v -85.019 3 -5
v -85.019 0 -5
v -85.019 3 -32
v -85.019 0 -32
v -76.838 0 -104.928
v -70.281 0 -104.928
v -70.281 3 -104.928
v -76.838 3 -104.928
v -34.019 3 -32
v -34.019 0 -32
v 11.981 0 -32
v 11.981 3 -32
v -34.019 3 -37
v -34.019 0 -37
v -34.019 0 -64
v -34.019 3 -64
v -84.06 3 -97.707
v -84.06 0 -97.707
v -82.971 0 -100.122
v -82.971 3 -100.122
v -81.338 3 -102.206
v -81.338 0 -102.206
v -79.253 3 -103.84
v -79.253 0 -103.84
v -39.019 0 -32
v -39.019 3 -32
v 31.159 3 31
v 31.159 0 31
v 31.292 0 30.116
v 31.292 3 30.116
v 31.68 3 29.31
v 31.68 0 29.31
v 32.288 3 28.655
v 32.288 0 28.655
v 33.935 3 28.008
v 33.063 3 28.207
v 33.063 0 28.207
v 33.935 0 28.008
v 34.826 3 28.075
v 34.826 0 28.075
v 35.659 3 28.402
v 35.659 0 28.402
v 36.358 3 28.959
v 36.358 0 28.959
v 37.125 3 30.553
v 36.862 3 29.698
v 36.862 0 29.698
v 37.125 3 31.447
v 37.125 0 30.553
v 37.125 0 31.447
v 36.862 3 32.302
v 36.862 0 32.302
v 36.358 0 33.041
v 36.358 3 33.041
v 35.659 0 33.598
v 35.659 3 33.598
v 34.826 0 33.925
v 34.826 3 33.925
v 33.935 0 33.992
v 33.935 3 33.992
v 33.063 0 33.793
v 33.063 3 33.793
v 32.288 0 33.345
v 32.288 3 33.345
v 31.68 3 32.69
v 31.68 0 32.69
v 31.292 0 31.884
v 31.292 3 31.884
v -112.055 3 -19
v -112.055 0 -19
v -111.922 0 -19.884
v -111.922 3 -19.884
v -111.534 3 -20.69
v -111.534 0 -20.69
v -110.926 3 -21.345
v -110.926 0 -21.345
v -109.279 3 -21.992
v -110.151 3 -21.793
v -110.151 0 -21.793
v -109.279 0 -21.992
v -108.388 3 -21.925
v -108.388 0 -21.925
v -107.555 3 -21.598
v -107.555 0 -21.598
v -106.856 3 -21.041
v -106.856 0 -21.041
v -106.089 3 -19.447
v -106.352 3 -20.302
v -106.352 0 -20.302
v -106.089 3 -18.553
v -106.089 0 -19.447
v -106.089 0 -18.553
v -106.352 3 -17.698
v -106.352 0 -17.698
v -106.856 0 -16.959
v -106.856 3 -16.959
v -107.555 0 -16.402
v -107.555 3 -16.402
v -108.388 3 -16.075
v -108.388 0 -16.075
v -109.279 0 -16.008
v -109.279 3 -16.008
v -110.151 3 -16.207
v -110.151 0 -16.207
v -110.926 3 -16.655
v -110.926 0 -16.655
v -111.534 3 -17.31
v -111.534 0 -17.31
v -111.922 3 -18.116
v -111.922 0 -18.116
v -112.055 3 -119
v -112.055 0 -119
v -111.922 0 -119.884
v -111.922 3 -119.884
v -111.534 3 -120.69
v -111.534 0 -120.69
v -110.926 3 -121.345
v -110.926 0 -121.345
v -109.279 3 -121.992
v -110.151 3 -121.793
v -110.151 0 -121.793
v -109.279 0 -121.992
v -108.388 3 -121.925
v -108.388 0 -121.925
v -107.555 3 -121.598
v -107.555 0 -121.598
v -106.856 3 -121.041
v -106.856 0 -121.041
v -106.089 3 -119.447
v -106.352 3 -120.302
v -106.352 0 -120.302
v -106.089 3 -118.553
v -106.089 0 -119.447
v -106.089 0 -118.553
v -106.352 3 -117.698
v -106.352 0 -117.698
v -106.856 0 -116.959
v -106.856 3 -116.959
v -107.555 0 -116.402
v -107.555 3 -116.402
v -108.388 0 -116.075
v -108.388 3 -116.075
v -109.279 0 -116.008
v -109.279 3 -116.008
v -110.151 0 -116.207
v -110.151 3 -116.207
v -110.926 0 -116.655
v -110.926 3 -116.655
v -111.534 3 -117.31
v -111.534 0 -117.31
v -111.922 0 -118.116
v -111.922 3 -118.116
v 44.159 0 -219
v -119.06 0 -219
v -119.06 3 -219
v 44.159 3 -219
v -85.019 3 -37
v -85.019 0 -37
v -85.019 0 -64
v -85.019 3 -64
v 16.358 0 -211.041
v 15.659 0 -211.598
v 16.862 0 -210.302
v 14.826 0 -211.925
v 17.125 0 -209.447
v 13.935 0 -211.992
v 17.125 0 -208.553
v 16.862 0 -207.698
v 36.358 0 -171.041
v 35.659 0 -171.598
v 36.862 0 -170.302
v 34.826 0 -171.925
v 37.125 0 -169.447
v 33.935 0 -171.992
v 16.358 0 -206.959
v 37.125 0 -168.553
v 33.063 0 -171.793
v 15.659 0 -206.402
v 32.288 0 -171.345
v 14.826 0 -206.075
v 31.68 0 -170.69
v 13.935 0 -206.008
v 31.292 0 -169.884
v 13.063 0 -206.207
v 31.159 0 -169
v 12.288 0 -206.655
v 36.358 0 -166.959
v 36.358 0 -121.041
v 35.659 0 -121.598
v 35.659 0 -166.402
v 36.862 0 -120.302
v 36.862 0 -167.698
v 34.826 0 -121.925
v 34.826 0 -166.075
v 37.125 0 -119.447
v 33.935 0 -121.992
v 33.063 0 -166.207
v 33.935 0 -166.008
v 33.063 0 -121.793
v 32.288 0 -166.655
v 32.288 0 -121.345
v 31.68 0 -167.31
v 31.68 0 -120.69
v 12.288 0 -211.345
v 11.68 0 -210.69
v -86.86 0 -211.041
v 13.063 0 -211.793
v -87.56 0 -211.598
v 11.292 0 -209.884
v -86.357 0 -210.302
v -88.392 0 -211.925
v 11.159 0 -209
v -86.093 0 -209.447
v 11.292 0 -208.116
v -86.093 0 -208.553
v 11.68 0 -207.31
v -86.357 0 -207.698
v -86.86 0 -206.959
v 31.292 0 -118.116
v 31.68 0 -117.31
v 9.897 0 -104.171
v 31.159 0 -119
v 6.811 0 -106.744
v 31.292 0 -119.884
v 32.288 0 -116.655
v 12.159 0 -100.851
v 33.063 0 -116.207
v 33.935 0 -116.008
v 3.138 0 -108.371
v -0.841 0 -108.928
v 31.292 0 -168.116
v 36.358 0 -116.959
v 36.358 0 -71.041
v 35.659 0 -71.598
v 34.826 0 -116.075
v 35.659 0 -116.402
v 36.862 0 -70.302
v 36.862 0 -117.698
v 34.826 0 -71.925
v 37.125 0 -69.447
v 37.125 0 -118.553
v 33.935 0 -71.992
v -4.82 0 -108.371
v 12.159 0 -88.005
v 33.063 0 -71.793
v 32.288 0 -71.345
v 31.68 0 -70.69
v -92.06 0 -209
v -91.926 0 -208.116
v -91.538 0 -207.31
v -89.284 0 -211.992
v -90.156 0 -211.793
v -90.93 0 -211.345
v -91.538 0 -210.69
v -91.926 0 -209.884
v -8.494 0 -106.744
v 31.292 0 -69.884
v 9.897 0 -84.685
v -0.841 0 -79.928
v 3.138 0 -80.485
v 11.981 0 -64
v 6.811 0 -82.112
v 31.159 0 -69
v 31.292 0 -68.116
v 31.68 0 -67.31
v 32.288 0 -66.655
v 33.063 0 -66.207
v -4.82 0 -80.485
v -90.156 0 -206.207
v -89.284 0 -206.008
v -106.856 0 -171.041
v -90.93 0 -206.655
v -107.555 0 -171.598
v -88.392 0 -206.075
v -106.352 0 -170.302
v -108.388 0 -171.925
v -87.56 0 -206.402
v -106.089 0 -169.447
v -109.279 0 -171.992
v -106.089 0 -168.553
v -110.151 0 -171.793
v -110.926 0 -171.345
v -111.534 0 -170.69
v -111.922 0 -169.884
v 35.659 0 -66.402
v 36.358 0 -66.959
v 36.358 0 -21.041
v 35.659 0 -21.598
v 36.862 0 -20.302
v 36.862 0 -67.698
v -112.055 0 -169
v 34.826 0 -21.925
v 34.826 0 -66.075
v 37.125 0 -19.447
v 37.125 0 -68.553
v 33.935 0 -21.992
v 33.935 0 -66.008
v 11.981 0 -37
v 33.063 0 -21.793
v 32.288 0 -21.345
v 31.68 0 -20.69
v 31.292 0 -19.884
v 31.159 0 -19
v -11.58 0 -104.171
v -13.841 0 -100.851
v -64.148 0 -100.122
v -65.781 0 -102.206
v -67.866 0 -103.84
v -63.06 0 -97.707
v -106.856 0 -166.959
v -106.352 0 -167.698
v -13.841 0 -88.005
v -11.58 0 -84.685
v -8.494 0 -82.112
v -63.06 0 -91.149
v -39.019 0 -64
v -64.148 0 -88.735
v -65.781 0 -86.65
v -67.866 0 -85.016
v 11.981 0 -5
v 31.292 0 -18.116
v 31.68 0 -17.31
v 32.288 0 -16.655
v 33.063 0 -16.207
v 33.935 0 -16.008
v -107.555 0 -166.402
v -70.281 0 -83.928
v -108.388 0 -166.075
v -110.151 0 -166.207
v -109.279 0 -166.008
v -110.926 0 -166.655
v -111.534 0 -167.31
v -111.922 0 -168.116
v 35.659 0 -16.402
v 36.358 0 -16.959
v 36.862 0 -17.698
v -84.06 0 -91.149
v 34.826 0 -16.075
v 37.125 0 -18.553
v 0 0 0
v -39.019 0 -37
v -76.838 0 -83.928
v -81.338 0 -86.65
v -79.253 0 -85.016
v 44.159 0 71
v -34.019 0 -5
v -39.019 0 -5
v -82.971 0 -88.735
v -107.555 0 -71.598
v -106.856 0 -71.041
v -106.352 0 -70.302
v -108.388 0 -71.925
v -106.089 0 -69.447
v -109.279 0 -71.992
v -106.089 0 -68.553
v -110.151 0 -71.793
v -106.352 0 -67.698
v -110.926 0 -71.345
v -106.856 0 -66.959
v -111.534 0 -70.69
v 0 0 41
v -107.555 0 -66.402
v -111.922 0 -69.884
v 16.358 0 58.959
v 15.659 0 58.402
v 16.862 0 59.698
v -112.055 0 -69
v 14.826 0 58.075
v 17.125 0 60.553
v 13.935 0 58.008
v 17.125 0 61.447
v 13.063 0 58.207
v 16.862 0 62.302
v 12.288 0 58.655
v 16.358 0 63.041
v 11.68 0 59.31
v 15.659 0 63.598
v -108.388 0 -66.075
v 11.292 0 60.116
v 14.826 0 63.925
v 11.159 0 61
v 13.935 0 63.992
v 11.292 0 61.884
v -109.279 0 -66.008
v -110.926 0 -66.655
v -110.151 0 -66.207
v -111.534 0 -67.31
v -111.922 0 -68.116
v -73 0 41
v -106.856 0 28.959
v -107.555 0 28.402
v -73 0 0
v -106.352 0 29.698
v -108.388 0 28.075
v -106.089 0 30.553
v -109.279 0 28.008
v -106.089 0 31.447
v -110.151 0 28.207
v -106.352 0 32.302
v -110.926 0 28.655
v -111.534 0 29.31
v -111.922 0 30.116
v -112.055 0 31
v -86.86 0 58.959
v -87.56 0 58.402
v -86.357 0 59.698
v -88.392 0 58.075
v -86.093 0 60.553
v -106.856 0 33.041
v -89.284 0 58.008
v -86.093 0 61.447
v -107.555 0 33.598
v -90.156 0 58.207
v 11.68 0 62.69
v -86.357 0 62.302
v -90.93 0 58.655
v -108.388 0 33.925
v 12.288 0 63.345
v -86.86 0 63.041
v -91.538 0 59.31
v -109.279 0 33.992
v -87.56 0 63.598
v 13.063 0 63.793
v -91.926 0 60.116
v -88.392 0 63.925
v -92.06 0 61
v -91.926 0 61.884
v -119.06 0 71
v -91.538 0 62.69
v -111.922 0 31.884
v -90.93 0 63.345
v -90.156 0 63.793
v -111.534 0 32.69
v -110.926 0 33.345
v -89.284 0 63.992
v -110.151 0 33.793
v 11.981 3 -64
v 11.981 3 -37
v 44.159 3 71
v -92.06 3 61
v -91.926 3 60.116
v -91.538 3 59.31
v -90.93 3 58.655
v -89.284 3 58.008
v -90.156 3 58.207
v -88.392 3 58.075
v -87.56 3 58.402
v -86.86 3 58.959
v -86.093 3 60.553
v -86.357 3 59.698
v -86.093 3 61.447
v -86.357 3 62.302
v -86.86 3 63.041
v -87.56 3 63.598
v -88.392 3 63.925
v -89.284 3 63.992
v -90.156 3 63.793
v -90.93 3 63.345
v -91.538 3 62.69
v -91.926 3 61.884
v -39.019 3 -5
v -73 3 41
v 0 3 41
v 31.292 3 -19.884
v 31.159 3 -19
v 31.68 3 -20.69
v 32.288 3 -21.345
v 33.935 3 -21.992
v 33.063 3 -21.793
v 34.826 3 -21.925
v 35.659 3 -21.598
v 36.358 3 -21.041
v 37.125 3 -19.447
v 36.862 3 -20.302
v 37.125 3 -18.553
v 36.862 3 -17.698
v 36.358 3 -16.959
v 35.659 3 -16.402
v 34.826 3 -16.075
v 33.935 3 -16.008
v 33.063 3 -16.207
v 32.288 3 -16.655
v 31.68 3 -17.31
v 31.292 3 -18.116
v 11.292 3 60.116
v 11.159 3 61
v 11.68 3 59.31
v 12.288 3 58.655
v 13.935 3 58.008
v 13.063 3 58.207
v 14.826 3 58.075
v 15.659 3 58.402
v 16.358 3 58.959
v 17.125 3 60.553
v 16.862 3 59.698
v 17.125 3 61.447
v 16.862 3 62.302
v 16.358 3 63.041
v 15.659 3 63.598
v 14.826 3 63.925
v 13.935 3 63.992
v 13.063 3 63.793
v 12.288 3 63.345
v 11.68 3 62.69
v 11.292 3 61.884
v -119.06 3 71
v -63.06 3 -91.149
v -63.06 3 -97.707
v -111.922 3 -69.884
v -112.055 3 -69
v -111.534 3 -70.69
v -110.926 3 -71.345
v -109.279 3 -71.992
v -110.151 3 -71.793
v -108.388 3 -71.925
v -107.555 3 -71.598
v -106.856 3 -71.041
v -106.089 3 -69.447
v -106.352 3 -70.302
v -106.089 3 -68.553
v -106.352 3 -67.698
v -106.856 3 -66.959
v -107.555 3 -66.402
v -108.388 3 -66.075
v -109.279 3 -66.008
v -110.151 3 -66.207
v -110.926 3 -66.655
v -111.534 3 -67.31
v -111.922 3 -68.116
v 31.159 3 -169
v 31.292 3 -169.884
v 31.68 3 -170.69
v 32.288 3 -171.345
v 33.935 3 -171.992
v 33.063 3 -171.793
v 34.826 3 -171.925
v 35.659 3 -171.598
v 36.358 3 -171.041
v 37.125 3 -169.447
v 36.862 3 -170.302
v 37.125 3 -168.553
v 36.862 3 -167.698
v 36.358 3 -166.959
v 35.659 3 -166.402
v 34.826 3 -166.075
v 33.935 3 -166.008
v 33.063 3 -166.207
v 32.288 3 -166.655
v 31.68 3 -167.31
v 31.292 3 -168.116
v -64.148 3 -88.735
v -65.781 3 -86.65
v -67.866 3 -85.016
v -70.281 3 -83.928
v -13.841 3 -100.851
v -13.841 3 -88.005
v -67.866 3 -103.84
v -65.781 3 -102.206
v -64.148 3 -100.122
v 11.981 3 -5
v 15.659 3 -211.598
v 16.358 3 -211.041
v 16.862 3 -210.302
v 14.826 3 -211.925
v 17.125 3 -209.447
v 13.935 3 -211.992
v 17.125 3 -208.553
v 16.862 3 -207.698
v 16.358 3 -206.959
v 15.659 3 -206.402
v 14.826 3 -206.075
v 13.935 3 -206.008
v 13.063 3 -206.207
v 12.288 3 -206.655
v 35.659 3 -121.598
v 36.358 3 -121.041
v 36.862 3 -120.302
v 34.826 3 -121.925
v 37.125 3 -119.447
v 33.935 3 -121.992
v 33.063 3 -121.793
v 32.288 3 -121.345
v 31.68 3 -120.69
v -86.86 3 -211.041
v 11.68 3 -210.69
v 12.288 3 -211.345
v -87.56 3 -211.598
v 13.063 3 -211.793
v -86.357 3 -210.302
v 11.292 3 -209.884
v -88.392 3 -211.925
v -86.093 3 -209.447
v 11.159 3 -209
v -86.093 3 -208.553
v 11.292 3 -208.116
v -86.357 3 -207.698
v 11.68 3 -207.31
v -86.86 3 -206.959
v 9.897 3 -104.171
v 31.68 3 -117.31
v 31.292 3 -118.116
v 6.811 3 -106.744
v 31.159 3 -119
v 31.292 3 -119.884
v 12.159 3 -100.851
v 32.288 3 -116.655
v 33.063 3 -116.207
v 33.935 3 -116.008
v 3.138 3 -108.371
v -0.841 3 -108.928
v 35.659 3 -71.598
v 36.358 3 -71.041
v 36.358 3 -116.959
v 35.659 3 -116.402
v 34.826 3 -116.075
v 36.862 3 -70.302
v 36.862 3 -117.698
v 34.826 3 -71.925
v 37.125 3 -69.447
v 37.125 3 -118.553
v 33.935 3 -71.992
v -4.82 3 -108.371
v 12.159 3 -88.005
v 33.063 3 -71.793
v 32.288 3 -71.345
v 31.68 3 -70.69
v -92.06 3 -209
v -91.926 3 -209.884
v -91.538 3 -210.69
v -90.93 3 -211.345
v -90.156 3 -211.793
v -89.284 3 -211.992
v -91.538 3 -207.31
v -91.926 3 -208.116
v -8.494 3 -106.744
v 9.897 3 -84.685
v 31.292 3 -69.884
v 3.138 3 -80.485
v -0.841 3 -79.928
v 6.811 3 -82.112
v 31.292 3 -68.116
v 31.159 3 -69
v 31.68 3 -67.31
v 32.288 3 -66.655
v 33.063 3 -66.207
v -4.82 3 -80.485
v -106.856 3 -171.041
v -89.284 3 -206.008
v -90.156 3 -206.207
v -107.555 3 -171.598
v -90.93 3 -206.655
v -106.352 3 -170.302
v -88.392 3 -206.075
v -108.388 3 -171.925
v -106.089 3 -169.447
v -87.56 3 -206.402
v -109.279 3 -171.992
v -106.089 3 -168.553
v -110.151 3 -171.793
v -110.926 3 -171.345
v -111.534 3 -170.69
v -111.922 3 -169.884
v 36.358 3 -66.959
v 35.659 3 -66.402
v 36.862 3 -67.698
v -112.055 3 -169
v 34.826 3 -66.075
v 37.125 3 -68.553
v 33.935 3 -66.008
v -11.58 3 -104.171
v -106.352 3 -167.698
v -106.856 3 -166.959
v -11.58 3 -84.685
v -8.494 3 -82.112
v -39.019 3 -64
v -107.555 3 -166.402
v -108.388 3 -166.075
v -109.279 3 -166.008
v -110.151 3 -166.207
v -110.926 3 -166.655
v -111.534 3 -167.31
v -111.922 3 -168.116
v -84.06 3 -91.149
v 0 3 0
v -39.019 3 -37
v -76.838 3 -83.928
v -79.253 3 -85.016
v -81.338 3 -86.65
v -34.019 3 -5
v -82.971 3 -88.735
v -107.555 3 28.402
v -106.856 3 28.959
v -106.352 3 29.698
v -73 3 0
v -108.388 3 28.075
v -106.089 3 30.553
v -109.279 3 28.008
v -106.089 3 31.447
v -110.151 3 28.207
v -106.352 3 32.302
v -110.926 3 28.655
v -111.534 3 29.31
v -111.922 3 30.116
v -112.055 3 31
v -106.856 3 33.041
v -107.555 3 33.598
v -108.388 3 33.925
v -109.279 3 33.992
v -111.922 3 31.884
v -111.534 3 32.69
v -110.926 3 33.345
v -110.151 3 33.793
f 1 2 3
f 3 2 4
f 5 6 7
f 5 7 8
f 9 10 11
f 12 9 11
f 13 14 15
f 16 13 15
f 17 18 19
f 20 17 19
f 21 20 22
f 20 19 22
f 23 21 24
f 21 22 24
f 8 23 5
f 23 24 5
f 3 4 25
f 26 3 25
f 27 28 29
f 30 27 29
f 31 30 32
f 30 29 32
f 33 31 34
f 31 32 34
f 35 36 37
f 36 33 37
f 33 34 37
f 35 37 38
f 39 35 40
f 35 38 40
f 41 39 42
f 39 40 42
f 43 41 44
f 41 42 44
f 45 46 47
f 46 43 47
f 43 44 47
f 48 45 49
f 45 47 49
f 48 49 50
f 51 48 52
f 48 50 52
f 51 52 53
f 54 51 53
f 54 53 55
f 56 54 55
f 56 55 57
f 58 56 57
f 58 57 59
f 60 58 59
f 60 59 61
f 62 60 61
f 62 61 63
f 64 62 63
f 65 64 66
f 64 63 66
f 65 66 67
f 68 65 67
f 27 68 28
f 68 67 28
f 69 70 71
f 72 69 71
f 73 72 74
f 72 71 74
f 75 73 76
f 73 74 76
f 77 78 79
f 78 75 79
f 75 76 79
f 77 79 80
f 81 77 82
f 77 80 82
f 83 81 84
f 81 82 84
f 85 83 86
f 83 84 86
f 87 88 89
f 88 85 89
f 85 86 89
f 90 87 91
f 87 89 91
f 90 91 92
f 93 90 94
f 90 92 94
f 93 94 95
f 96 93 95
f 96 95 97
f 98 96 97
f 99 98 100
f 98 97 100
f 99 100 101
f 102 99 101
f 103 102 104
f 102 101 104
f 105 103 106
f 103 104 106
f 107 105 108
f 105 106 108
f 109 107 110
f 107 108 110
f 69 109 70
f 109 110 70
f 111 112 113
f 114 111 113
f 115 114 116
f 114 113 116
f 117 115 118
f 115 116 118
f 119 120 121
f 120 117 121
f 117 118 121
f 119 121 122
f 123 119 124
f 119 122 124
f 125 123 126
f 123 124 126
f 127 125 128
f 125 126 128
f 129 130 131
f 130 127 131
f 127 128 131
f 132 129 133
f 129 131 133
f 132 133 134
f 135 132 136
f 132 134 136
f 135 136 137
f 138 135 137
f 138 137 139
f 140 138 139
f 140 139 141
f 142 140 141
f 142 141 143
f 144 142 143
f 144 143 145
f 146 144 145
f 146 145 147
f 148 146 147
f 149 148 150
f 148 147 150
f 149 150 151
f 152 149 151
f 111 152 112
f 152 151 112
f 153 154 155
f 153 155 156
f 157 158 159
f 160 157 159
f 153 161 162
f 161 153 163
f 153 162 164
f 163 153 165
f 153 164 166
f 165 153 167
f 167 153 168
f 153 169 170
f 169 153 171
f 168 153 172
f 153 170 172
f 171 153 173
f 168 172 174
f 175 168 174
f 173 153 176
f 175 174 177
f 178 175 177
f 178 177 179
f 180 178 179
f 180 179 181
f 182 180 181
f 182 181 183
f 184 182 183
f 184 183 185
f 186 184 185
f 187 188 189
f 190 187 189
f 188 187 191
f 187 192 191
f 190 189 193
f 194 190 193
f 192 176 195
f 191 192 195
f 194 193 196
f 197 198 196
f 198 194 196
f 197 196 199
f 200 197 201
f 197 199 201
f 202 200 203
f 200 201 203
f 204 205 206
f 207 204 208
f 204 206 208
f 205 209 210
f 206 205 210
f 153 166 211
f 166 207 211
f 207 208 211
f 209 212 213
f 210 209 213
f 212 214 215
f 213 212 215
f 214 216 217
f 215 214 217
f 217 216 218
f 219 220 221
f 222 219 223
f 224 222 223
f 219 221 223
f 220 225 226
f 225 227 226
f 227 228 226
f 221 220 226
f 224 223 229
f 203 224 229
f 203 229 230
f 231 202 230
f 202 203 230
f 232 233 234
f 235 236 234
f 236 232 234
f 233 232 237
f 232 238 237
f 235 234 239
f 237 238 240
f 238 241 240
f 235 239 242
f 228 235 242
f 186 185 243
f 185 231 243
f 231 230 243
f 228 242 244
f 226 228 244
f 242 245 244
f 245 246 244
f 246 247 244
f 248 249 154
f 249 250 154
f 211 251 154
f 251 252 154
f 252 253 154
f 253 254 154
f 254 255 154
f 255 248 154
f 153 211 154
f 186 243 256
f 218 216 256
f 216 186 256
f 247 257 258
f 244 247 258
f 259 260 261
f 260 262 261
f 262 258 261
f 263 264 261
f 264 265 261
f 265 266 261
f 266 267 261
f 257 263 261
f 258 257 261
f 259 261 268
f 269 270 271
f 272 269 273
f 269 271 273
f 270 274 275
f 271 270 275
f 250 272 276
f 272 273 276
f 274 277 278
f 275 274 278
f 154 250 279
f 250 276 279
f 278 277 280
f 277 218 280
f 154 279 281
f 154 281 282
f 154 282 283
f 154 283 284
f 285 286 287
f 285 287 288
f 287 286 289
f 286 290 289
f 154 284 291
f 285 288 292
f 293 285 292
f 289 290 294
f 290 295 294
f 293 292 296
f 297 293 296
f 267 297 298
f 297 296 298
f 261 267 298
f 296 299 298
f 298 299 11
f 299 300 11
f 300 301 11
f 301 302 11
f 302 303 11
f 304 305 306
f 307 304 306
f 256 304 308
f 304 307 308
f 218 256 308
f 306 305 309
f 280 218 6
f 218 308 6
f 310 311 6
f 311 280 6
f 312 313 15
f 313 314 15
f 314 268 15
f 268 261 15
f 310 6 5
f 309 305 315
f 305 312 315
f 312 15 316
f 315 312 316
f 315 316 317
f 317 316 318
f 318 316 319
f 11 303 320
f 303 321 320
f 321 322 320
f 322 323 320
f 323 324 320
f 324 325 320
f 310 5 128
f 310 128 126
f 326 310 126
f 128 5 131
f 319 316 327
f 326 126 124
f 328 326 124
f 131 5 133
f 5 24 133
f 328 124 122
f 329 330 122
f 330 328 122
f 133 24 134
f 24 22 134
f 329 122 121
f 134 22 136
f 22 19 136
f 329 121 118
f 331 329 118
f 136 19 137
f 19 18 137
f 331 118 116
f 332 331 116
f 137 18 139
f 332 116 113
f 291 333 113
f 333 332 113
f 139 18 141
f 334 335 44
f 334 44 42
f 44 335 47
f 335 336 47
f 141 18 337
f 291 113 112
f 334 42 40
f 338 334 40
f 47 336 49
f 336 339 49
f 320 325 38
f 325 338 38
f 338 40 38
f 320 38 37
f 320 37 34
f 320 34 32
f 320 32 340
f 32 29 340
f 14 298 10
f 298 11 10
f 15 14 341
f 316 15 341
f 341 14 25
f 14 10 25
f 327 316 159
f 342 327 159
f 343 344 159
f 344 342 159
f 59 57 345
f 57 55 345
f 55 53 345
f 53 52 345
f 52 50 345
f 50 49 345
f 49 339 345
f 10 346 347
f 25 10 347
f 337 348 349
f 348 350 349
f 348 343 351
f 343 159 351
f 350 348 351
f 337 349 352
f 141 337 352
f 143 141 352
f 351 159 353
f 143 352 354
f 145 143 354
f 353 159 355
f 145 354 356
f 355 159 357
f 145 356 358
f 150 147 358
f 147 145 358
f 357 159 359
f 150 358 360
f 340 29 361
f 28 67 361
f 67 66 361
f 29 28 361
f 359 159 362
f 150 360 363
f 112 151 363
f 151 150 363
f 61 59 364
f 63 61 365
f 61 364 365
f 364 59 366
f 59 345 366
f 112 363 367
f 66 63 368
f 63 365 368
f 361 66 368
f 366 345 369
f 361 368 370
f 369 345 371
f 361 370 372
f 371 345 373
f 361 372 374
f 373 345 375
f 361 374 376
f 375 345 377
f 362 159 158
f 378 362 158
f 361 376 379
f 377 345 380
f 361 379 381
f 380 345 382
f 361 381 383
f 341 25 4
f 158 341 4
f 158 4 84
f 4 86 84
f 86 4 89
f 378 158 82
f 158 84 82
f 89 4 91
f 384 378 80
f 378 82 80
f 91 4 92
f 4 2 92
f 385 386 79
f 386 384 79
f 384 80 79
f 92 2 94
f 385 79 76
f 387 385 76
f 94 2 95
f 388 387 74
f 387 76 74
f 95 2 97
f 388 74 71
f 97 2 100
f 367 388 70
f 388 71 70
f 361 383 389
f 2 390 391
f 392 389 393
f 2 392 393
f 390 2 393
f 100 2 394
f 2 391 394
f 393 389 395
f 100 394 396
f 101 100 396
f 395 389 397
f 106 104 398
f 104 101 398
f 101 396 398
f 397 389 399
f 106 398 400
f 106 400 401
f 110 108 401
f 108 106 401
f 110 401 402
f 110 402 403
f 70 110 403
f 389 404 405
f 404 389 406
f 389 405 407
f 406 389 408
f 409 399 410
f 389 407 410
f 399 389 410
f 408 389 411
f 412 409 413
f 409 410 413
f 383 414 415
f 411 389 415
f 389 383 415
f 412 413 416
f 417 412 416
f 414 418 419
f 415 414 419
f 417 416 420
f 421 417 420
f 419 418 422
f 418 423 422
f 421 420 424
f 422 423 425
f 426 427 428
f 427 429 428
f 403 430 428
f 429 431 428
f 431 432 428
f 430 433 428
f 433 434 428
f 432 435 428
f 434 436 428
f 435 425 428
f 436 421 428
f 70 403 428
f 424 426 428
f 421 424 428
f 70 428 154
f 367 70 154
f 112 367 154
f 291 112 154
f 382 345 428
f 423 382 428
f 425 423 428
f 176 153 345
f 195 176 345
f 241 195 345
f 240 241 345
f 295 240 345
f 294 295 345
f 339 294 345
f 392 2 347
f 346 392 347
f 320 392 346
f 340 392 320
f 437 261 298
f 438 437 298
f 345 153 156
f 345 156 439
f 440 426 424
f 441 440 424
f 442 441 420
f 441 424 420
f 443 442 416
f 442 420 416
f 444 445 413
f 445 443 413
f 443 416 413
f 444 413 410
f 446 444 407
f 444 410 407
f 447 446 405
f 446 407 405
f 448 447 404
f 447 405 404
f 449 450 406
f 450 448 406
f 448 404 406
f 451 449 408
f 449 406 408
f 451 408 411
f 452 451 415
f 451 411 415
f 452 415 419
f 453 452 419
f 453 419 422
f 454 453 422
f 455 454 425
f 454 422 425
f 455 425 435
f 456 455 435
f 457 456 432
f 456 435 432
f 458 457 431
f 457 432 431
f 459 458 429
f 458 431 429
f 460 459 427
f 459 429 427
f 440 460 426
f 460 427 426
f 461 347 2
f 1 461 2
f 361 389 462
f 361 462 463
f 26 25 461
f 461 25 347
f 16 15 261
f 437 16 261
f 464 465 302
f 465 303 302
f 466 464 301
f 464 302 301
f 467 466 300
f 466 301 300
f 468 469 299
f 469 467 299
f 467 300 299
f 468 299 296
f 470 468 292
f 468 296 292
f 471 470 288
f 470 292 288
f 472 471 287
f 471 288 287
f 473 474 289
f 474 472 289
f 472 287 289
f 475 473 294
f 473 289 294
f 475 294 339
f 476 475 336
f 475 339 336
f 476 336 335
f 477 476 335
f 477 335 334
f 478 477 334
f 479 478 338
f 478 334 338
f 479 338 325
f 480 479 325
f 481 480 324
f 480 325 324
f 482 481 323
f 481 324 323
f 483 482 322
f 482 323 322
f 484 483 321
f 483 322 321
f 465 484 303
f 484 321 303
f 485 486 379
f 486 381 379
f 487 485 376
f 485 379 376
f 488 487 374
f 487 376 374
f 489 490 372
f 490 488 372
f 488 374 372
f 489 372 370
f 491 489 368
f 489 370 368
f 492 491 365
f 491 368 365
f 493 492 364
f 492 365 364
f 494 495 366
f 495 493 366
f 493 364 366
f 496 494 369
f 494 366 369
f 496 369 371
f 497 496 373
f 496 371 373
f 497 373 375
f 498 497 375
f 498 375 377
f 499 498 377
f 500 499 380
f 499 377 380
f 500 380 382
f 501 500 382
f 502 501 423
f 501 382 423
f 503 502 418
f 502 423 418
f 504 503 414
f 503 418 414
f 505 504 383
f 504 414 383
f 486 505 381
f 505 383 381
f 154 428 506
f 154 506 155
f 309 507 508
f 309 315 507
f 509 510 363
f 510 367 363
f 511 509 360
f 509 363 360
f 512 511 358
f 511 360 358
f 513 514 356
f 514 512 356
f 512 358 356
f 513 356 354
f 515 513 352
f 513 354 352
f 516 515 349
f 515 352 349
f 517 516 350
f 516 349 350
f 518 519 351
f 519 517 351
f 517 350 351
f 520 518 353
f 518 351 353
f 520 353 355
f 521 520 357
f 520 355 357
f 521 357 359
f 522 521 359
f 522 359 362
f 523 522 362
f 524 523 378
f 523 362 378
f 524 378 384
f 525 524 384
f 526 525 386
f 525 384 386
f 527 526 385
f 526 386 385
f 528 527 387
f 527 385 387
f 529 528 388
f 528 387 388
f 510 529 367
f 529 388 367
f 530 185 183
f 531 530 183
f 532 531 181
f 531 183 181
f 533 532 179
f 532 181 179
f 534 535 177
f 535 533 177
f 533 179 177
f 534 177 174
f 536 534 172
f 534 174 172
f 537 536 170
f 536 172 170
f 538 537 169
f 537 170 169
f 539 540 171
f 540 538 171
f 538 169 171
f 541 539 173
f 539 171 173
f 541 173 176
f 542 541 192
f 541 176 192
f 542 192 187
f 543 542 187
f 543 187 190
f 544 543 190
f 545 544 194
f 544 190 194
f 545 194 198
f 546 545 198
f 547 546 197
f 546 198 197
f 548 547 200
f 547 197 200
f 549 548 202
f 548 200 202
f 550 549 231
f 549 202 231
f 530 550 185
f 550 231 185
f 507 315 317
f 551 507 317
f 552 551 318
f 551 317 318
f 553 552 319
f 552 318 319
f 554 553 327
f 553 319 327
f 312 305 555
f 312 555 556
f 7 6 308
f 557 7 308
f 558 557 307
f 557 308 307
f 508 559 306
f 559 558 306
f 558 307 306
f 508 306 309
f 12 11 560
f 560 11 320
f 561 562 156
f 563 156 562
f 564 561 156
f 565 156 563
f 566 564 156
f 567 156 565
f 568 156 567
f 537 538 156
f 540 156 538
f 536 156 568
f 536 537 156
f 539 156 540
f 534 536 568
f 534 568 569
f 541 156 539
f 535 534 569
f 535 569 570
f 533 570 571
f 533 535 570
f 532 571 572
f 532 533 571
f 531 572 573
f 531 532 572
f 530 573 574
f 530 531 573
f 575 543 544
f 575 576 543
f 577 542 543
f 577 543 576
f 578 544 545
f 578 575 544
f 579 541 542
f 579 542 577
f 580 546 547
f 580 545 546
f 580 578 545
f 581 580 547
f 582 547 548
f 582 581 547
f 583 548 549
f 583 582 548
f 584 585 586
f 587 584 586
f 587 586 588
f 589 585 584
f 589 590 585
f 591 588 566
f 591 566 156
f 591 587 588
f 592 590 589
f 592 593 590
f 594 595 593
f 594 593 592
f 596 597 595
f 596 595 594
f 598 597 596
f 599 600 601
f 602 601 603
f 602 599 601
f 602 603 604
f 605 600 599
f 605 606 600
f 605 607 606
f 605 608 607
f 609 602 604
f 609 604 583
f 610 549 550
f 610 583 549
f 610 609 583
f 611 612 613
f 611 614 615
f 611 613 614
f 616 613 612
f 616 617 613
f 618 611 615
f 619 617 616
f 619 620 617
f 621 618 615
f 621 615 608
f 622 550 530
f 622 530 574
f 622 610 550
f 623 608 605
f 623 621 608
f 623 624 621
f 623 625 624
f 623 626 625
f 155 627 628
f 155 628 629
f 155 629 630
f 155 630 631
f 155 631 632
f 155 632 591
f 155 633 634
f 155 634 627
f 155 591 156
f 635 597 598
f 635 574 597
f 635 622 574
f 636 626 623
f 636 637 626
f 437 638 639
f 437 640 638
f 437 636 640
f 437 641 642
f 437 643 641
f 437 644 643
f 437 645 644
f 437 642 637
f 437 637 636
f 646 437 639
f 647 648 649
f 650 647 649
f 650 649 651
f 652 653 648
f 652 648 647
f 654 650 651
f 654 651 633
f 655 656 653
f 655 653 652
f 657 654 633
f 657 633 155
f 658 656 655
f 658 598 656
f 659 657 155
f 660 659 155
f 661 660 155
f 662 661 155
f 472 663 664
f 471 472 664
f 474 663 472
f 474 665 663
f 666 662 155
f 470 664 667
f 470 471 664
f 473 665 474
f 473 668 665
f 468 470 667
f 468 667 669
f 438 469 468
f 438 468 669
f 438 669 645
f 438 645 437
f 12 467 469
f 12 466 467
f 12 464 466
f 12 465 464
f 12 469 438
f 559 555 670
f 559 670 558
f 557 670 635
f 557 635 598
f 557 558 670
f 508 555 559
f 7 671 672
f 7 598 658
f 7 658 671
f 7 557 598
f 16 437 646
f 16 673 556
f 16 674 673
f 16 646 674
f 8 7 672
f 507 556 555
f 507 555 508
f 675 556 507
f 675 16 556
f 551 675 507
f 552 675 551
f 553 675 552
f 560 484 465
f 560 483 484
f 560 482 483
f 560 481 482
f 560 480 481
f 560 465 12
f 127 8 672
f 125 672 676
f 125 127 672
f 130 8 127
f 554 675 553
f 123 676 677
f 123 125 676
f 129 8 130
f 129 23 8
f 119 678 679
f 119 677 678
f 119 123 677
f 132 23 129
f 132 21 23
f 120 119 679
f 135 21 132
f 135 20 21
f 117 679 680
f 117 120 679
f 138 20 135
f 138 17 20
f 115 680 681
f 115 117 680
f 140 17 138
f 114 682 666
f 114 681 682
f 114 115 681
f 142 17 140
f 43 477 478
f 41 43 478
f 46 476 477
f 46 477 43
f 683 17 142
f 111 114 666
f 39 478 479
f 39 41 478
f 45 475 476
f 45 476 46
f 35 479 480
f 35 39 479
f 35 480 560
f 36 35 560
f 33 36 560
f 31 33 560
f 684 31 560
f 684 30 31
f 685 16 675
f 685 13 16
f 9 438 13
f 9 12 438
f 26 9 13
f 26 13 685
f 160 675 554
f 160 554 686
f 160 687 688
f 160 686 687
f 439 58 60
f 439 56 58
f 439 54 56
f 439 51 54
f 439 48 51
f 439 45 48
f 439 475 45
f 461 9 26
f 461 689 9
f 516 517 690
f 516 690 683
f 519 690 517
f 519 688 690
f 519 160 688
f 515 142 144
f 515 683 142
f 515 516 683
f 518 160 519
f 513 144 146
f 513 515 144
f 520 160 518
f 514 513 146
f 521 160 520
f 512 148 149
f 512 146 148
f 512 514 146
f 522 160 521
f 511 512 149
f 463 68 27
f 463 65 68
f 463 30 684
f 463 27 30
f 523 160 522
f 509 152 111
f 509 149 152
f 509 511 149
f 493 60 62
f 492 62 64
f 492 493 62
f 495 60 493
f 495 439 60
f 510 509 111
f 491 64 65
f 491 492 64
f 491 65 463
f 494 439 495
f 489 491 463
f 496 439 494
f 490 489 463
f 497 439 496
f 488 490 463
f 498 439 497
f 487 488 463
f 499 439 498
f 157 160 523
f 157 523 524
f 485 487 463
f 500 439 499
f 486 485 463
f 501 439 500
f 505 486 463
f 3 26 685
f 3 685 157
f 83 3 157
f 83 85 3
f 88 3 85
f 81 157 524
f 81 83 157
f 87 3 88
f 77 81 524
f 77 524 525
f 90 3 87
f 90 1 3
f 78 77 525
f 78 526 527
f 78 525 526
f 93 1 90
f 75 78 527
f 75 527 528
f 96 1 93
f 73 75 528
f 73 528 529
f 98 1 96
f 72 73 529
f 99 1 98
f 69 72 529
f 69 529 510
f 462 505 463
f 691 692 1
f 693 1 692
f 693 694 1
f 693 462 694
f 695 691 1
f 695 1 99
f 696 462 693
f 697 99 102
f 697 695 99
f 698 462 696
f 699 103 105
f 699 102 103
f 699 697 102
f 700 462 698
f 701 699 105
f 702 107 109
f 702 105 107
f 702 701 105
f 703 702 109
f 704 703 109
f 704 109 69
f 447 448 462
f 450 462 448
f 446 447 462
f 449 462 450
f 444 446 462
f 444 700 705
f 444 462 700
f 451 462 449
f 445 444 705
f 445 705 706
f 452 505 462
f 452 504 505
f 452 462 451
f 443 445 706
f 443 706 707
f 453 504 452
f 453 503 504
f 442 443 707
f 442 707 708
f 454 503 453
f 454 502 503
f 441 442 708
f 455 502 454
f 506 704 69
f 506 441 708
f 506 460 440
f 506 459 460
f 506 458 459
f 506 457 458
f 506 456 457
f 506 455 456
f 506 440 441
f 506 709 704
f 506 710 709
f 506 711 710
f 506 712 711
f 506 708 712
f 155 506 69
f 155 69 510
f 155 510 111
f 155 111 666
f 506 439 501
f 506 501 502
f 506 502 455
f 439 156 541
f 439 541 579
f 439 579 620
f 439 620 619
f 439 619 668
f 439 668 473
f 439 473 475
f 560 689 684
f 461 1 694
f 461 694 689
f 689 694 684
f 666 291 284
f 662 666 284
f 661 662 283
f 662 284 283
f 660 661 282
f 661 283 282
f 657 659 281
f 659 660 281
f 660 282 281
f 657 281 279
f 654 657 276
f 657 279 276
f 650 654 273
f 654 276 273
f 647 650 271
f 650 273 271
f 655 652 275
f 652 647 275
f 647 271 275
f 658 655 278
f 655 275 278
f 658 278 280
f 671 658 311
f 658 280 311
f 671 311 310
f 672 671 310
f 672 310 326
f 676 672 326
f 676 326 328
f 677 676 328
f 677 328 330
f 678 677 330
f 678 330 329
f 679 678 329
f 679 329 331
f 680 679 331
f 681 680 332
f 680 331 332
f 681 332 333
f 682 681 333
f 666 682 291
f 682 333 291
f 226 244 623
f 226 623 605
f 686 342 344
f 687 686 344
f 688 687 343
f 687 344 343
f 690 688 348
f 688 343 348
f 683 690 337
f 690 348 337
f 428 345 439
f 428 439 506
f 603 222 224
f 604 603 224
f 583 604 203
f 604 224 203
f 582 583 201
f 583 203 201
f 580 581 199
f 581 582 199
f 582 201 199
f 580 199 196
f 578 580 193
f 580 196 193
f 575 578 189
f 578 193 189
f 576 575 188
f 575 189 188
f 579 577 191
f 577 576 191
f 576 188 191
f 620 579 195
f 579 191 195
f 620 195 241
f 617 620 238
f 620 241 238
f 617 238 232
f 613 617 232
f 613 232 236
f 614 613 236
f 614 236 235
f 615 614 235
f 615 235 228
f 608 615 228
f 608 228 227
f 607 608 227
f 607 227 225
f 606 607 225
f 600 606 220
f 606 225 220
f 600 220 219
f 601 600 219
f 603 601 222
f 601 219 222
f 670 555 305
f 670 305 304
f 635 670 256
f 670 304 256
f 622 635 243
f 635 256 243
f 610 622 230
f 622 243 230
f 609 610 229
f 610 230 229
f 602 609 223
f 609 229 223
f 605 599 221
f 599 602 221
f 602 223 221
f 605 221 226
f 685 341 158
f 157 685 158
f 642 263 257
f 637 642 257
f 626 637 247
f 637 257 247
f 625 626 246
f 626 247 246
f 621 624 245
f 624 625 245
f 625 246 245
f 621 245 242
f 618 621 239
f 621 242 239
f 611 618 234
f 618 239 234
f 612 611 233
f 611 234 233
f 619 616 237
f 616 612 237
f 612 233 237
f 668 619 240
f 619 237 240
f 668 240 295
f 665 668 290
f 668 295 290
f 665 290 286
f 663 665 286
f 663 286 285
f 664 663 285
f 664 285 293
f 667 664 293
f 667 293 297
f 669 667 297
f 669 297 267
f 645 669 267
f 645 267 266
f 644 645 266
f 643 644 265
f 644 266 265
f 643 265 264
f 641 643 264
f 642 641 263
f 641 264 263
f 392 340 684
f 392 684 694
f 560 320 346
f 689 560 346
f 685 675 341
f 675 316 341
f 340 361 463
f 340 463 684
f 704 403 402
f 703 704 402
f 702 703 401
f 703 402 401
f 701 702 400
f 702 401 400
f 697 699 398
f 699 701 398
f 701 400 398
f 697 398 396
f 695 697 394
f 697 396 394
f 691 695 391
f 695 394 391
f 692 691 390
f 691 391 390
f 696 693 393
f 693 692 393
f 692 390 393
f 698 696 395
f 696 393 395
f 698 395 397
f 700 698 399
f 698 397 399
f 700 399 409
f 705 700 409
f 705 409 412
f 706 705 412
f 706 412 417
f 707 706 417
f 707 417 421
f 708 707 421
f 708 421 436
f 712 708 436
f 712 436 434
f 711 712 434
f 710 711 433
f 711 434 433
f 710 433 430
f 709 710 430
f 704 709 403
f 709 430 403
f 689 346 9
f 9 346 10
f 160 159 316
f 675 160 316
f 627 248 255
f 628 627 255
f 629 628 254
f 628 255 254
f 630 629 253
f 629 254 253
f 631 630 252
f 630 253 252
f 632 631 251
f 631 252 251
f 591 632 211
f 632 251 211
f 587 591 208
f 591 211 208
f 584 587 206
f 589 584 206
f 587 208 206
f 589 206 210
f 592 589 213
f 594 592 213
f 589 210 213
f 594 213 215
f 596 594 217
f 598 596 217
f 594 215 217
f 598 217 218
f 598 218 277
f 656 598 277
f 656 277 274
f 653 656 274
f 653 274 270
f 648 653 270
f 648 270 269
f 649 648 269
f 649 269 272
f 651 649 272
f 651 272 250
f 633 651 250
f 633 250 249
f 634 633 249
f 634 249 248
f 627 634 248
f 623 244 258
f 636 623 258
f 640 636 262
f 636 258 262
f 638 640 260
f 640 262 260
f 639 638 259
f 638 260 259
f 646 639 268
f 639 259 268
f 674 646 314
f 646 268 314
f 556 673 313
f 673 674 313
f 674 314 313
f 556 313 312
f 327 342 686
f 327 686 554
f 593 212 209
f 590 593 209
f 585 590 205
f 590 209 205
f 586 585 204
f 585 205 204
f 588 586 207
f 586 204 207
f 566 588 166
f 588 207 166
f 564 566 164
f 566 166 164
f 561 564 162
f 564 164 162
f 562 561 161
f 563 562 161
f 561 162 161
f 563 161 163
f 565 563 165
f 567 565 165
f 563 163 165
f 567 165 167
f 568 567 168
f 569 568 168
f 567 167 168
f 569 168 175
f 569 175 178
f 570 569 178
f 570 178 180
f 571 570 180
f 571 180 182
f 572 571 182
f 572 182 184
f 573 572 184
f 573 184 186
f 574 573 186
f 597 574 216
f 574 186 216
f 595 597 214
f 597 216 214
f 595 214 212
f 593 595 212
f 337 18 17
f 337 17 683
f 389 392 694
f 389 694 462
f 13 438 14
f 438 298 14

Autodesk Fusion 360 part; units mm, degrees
sketch "ControlPanel" plane through (0, 0, 0) normal (0, 1, 0) x (-1, 0, 0)
  line L0 (0, 0) -> (73, 0)
  line L1 (73, 0) -> (73, 41)
  line L2 (73, 41) -> (0, 41)
  line L3 (0, 41) -> (0, 0)
  line L4 (-11.9813, -5) -> (34.0187, -5)
  line L5 (34.0187, -5) -> (34.0187, -32)
  line L6 (34.0187, -32) -> (-11.9813, -32)
  line L7 (-11.9813, -32) -> (-11.9813, -5)
  line L8 (77.6844, -83.0568) -> (77.6844, -82.5327)
  line L9 (-12.1589, -88.0054) -> (-12.1589, -100.8506)
  line L10 (13.8411, -100.8506) -> (13.8411, -88.0054)
  arc A0 (-12.1589, -100.8506) -> (13.8411, -100.8506) centre (0.8411, -94.428) ccw
  arc A1 (13.8411, -88.0054) -> (-12.1589, -88.0054) centre (0.8411, -94.428) ccw
  line L11 (76.8382, -83.928) -> (70.2808, -83.928)
  line L12 (63.0595, -91.1493) -> (63.0595, -97.7068)
  line L13 (70.2808, -104.928) -> (76.8382, -104.928)
  line L14 (84.0595, -97.7068) -> (84.0595, -91.1493)
  arc A2 (70.2808, -83.928) -> (63.0595, -91.1493) centre (73.5595, -94.428) ccw
  arc A3 (84.0595, -91.1493) -> (76.8382, -83.928) centre (73.5595, -94.428) ccw
  arc A4 (63.0595, -97.7068) -> (70.2808, -104.928) centre (73.5595, -94.428) ccw
  arc A5 (76.8382, -104.928) -> (84.0595, -97.7068) centre (73.5595, -94.428) ccw
  line L15 (39.0187, -5) -> (85.0187, -5)
  line L16 (85.0187, -5) -> (85.0187, -32)
  line L17 (85.0187, -32) -> (39.0187, -32)
  line L18 (39.0187, -32) -> (39.0187, -5)
  line L19 (-11.9813, -37) -> (34.0187, -37)
  line L20 (34.0187, -37) -> (34.0187, -64)
  line L21 (34.0187, -64) -> (-11.9813, -64)
  line L22 (-11.9813, -64) -> (-11.9813, -37)
  line L23 (39.0187, -37) -> (85.0187, -37)
  line L24 (85.0187, -37) -> (85.0187, -64)
  line L25 (85.0187, -64) -> (39.0187, -64)
  line L26 (39.0187, -64) -> (39.0187, -37)
  line L27 (34.0187, -5) -> (39.0187, -5) construction
  circle A6 centre (36.5, -94.428) radius 0.6723 construction
  line L28 (119.0595, -139.428) -> (119.0595, 71) construction
  line L29 (119.0595, 71) -> (-44.1589, 71) construction
  line L30 (-44.1589, 71) -> (-44.1589, -139.428) construction
  line L31 (-44.1589, 71) -> (119.0595, 71)
  line L32 (119.0595, 71) -> (119.0595, -219)
  line L33 (119.0595, -219) -> (-44.1589, -219)
  line L34 (-44.1589, -219) -> (-44.1589, 71)
  circle A7 centre (-14.1589, 61) radius 3
  circle A8 centre (89.0595, 61) radius 3
  circle A9 centre (-34.1589, 31) radius 3
  circle A10 centre (109.0551, 31) radius 3
  circle A11 centre (-34.1589, -19) radius 3
  circle A12 centre (109.0551, -19) radius 3
  circle A13 centre (-34.1589, -69) radius 3
  circle A14 centre (109.0551, -69) radius 3
  circle A15 centre (-34.1589, -119) radius 3
  circle A16 centre (109.0551, -119) radius 3
  circle A17 centre (-34.1589, -169) radius 3
  circle A18 centre (109.0551, -169) radius 3
  circle A19 centre (-14.1589, -209) radius 3
  circle A20 centre (89.0595, -209) radius 3
  point P0 (73.5595, -94.428)
  point P1 (0.8411, -94.428)
  point P2 (73.5595, -94.428)
  point P3 (0.8411, -94.428)
  point P4 (73.5595, -94.428)
  point P5 (-14.1589, -209)
  point P6 (89.0595, -209)
  dimension "d12" = 73
  dimension "d13" = 41
  dimension "d15" = 46
  dimension "d16" = 27
  dimension "d17" = 5
  dimension "d33" = 29
  dimension "d36" = 22
  dimension "d88" = 46
  dimension "d89" = 27
  dimension "d90" = 5
  dimension "d91" = 46
  dimension "d92" = 27
  dimension "d93" = 5
  dimension "d94" = 46
  dimension "d95" = 27
  dimension "d96" = 5
  dimension "d110" = 210.428
  dimension "d111" = 290
  dimension "d113" = 6
  dimension "d114" = 30
  dimension "d115" = 6
  dimension "d116" = 30
  dimension "d123" = 6
  dimension "d124" = 40
  dimension "d127" = 143.214
  dimension "d128" = -200
extrude "Extrude3" add sketch "ControlPanel" along normal blind 3 contours L31 L32 L33 L34 | A19 | A20
extrude "Extrude5" cut sketch "ControlPanel" along normal mid plane 12 contours A19
extrude "Extrude6" cut sketch "ControlPanel" along normal mid plane 12 contours A20
extrude "Extrude1" [suppressed]
equation "m2_w = 73 mm"
equation "m2_h = 41 mm"
equation "m1_w = 46 mm"
equation "m1_h = 27 mm"
equation "mpwr_dia = 12.2 mm"
equation "mpwr_key = 1 mm"
equation "reset_dia = 12.5 mm"
equation "apwr_dia = 29 mm"
equation "apwr_key = 26 mm"
equation "estop_dia = 22 mm"
equation "estop_key = 21 mm"
equation "d12 = m2_w"
equation "d13 = m2_h"
equation "meter_v = 5 mm"
equation "d15 = m1_w"
equation "d16 = m1_h"
equation "d17 = meter_v"
equation "apwr_shell = 37 mm"
equation "botrow_offset = 35 mm"
equation "d33 = apwr_dia"
equation "d36 = estop_dia"
equation "sw_dist = 100 mm"
equation "sw_offs = 25 mm"
equation "text_top_offs = 5 mm"
equation "d88 = m1_w"
equation "d89 = m1_h"
equation "d90 = meter_v"
equation "d91 = m1_w"
equation "d92 = m1_h"
equation "d93 = meter_v"
equation "d94 = m1_w"
equation "d95 = m1_h"
